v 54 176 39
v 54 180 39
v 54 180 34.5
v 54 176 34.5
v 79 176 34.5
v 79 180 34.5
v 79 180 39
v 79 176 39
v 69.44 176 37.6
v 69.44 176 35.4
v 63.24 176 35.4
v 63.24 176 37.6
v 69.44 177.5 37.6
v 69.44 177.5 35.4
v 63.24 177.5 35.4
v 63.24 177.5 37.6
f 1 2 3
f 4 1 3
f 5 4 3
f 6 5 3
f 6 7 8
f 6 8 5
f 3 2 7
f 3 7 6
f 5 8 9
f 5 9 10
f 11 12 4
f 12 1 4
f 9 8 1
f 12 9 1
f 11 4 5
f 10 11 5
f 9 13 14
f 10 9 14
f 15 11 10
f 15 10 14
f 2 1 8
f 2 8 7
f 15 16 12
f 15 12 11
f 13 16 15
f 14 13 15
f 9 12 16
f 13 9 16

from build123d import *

# Parameters (mm, degrees)
CROSSHEAD_START = 54
SKETCH1_W       = 4.5
SKETCH1_H       = 4
CROSSHEAD_DEPTH = 25
ROD_SLOT_START  = 63.24
SKETCH2_W       = 2.2
SKETCH2_H       = 1.6
ROD_SLOT_DEPTH  = 6.2


with BuildPart() as part:
    # Sketch1 → crosshead (new body)
    with BuildSketch(Plane(origin=(0, 0, 0), x_dir=(0, 0, -1), z_dir=(1, 0, 0)).offset(CROSSHEAD_START)):
        with Locations((-36.75, 178)):
            Rectangle(SKETCH1_W, SKETCH1_H)
    extrude(amount=CROSSHEAD_DEPTH)


with BuildPart() as body_2:
    # Sketch2 → rod_slot (new body)
    with BuildSketch(Plane(origin=(0, 0, 0), x_dir=(0, 0, -1), z_dir=(1, 0, 0)).offset(ROD_SLOT_START)):
        with Locations((-36.5, 176.7)):
            Rectangle(SKETCH2_W, SKETCH2_H)
    extrude(amount=ROD_SLOT_DEPTH)


with BuildPart() as part_1:
    add(part.part)

    # Combine1: cut body 2
    add(body_2.part, mode=Mode.SUBTRACT)


solid = part_1.part
